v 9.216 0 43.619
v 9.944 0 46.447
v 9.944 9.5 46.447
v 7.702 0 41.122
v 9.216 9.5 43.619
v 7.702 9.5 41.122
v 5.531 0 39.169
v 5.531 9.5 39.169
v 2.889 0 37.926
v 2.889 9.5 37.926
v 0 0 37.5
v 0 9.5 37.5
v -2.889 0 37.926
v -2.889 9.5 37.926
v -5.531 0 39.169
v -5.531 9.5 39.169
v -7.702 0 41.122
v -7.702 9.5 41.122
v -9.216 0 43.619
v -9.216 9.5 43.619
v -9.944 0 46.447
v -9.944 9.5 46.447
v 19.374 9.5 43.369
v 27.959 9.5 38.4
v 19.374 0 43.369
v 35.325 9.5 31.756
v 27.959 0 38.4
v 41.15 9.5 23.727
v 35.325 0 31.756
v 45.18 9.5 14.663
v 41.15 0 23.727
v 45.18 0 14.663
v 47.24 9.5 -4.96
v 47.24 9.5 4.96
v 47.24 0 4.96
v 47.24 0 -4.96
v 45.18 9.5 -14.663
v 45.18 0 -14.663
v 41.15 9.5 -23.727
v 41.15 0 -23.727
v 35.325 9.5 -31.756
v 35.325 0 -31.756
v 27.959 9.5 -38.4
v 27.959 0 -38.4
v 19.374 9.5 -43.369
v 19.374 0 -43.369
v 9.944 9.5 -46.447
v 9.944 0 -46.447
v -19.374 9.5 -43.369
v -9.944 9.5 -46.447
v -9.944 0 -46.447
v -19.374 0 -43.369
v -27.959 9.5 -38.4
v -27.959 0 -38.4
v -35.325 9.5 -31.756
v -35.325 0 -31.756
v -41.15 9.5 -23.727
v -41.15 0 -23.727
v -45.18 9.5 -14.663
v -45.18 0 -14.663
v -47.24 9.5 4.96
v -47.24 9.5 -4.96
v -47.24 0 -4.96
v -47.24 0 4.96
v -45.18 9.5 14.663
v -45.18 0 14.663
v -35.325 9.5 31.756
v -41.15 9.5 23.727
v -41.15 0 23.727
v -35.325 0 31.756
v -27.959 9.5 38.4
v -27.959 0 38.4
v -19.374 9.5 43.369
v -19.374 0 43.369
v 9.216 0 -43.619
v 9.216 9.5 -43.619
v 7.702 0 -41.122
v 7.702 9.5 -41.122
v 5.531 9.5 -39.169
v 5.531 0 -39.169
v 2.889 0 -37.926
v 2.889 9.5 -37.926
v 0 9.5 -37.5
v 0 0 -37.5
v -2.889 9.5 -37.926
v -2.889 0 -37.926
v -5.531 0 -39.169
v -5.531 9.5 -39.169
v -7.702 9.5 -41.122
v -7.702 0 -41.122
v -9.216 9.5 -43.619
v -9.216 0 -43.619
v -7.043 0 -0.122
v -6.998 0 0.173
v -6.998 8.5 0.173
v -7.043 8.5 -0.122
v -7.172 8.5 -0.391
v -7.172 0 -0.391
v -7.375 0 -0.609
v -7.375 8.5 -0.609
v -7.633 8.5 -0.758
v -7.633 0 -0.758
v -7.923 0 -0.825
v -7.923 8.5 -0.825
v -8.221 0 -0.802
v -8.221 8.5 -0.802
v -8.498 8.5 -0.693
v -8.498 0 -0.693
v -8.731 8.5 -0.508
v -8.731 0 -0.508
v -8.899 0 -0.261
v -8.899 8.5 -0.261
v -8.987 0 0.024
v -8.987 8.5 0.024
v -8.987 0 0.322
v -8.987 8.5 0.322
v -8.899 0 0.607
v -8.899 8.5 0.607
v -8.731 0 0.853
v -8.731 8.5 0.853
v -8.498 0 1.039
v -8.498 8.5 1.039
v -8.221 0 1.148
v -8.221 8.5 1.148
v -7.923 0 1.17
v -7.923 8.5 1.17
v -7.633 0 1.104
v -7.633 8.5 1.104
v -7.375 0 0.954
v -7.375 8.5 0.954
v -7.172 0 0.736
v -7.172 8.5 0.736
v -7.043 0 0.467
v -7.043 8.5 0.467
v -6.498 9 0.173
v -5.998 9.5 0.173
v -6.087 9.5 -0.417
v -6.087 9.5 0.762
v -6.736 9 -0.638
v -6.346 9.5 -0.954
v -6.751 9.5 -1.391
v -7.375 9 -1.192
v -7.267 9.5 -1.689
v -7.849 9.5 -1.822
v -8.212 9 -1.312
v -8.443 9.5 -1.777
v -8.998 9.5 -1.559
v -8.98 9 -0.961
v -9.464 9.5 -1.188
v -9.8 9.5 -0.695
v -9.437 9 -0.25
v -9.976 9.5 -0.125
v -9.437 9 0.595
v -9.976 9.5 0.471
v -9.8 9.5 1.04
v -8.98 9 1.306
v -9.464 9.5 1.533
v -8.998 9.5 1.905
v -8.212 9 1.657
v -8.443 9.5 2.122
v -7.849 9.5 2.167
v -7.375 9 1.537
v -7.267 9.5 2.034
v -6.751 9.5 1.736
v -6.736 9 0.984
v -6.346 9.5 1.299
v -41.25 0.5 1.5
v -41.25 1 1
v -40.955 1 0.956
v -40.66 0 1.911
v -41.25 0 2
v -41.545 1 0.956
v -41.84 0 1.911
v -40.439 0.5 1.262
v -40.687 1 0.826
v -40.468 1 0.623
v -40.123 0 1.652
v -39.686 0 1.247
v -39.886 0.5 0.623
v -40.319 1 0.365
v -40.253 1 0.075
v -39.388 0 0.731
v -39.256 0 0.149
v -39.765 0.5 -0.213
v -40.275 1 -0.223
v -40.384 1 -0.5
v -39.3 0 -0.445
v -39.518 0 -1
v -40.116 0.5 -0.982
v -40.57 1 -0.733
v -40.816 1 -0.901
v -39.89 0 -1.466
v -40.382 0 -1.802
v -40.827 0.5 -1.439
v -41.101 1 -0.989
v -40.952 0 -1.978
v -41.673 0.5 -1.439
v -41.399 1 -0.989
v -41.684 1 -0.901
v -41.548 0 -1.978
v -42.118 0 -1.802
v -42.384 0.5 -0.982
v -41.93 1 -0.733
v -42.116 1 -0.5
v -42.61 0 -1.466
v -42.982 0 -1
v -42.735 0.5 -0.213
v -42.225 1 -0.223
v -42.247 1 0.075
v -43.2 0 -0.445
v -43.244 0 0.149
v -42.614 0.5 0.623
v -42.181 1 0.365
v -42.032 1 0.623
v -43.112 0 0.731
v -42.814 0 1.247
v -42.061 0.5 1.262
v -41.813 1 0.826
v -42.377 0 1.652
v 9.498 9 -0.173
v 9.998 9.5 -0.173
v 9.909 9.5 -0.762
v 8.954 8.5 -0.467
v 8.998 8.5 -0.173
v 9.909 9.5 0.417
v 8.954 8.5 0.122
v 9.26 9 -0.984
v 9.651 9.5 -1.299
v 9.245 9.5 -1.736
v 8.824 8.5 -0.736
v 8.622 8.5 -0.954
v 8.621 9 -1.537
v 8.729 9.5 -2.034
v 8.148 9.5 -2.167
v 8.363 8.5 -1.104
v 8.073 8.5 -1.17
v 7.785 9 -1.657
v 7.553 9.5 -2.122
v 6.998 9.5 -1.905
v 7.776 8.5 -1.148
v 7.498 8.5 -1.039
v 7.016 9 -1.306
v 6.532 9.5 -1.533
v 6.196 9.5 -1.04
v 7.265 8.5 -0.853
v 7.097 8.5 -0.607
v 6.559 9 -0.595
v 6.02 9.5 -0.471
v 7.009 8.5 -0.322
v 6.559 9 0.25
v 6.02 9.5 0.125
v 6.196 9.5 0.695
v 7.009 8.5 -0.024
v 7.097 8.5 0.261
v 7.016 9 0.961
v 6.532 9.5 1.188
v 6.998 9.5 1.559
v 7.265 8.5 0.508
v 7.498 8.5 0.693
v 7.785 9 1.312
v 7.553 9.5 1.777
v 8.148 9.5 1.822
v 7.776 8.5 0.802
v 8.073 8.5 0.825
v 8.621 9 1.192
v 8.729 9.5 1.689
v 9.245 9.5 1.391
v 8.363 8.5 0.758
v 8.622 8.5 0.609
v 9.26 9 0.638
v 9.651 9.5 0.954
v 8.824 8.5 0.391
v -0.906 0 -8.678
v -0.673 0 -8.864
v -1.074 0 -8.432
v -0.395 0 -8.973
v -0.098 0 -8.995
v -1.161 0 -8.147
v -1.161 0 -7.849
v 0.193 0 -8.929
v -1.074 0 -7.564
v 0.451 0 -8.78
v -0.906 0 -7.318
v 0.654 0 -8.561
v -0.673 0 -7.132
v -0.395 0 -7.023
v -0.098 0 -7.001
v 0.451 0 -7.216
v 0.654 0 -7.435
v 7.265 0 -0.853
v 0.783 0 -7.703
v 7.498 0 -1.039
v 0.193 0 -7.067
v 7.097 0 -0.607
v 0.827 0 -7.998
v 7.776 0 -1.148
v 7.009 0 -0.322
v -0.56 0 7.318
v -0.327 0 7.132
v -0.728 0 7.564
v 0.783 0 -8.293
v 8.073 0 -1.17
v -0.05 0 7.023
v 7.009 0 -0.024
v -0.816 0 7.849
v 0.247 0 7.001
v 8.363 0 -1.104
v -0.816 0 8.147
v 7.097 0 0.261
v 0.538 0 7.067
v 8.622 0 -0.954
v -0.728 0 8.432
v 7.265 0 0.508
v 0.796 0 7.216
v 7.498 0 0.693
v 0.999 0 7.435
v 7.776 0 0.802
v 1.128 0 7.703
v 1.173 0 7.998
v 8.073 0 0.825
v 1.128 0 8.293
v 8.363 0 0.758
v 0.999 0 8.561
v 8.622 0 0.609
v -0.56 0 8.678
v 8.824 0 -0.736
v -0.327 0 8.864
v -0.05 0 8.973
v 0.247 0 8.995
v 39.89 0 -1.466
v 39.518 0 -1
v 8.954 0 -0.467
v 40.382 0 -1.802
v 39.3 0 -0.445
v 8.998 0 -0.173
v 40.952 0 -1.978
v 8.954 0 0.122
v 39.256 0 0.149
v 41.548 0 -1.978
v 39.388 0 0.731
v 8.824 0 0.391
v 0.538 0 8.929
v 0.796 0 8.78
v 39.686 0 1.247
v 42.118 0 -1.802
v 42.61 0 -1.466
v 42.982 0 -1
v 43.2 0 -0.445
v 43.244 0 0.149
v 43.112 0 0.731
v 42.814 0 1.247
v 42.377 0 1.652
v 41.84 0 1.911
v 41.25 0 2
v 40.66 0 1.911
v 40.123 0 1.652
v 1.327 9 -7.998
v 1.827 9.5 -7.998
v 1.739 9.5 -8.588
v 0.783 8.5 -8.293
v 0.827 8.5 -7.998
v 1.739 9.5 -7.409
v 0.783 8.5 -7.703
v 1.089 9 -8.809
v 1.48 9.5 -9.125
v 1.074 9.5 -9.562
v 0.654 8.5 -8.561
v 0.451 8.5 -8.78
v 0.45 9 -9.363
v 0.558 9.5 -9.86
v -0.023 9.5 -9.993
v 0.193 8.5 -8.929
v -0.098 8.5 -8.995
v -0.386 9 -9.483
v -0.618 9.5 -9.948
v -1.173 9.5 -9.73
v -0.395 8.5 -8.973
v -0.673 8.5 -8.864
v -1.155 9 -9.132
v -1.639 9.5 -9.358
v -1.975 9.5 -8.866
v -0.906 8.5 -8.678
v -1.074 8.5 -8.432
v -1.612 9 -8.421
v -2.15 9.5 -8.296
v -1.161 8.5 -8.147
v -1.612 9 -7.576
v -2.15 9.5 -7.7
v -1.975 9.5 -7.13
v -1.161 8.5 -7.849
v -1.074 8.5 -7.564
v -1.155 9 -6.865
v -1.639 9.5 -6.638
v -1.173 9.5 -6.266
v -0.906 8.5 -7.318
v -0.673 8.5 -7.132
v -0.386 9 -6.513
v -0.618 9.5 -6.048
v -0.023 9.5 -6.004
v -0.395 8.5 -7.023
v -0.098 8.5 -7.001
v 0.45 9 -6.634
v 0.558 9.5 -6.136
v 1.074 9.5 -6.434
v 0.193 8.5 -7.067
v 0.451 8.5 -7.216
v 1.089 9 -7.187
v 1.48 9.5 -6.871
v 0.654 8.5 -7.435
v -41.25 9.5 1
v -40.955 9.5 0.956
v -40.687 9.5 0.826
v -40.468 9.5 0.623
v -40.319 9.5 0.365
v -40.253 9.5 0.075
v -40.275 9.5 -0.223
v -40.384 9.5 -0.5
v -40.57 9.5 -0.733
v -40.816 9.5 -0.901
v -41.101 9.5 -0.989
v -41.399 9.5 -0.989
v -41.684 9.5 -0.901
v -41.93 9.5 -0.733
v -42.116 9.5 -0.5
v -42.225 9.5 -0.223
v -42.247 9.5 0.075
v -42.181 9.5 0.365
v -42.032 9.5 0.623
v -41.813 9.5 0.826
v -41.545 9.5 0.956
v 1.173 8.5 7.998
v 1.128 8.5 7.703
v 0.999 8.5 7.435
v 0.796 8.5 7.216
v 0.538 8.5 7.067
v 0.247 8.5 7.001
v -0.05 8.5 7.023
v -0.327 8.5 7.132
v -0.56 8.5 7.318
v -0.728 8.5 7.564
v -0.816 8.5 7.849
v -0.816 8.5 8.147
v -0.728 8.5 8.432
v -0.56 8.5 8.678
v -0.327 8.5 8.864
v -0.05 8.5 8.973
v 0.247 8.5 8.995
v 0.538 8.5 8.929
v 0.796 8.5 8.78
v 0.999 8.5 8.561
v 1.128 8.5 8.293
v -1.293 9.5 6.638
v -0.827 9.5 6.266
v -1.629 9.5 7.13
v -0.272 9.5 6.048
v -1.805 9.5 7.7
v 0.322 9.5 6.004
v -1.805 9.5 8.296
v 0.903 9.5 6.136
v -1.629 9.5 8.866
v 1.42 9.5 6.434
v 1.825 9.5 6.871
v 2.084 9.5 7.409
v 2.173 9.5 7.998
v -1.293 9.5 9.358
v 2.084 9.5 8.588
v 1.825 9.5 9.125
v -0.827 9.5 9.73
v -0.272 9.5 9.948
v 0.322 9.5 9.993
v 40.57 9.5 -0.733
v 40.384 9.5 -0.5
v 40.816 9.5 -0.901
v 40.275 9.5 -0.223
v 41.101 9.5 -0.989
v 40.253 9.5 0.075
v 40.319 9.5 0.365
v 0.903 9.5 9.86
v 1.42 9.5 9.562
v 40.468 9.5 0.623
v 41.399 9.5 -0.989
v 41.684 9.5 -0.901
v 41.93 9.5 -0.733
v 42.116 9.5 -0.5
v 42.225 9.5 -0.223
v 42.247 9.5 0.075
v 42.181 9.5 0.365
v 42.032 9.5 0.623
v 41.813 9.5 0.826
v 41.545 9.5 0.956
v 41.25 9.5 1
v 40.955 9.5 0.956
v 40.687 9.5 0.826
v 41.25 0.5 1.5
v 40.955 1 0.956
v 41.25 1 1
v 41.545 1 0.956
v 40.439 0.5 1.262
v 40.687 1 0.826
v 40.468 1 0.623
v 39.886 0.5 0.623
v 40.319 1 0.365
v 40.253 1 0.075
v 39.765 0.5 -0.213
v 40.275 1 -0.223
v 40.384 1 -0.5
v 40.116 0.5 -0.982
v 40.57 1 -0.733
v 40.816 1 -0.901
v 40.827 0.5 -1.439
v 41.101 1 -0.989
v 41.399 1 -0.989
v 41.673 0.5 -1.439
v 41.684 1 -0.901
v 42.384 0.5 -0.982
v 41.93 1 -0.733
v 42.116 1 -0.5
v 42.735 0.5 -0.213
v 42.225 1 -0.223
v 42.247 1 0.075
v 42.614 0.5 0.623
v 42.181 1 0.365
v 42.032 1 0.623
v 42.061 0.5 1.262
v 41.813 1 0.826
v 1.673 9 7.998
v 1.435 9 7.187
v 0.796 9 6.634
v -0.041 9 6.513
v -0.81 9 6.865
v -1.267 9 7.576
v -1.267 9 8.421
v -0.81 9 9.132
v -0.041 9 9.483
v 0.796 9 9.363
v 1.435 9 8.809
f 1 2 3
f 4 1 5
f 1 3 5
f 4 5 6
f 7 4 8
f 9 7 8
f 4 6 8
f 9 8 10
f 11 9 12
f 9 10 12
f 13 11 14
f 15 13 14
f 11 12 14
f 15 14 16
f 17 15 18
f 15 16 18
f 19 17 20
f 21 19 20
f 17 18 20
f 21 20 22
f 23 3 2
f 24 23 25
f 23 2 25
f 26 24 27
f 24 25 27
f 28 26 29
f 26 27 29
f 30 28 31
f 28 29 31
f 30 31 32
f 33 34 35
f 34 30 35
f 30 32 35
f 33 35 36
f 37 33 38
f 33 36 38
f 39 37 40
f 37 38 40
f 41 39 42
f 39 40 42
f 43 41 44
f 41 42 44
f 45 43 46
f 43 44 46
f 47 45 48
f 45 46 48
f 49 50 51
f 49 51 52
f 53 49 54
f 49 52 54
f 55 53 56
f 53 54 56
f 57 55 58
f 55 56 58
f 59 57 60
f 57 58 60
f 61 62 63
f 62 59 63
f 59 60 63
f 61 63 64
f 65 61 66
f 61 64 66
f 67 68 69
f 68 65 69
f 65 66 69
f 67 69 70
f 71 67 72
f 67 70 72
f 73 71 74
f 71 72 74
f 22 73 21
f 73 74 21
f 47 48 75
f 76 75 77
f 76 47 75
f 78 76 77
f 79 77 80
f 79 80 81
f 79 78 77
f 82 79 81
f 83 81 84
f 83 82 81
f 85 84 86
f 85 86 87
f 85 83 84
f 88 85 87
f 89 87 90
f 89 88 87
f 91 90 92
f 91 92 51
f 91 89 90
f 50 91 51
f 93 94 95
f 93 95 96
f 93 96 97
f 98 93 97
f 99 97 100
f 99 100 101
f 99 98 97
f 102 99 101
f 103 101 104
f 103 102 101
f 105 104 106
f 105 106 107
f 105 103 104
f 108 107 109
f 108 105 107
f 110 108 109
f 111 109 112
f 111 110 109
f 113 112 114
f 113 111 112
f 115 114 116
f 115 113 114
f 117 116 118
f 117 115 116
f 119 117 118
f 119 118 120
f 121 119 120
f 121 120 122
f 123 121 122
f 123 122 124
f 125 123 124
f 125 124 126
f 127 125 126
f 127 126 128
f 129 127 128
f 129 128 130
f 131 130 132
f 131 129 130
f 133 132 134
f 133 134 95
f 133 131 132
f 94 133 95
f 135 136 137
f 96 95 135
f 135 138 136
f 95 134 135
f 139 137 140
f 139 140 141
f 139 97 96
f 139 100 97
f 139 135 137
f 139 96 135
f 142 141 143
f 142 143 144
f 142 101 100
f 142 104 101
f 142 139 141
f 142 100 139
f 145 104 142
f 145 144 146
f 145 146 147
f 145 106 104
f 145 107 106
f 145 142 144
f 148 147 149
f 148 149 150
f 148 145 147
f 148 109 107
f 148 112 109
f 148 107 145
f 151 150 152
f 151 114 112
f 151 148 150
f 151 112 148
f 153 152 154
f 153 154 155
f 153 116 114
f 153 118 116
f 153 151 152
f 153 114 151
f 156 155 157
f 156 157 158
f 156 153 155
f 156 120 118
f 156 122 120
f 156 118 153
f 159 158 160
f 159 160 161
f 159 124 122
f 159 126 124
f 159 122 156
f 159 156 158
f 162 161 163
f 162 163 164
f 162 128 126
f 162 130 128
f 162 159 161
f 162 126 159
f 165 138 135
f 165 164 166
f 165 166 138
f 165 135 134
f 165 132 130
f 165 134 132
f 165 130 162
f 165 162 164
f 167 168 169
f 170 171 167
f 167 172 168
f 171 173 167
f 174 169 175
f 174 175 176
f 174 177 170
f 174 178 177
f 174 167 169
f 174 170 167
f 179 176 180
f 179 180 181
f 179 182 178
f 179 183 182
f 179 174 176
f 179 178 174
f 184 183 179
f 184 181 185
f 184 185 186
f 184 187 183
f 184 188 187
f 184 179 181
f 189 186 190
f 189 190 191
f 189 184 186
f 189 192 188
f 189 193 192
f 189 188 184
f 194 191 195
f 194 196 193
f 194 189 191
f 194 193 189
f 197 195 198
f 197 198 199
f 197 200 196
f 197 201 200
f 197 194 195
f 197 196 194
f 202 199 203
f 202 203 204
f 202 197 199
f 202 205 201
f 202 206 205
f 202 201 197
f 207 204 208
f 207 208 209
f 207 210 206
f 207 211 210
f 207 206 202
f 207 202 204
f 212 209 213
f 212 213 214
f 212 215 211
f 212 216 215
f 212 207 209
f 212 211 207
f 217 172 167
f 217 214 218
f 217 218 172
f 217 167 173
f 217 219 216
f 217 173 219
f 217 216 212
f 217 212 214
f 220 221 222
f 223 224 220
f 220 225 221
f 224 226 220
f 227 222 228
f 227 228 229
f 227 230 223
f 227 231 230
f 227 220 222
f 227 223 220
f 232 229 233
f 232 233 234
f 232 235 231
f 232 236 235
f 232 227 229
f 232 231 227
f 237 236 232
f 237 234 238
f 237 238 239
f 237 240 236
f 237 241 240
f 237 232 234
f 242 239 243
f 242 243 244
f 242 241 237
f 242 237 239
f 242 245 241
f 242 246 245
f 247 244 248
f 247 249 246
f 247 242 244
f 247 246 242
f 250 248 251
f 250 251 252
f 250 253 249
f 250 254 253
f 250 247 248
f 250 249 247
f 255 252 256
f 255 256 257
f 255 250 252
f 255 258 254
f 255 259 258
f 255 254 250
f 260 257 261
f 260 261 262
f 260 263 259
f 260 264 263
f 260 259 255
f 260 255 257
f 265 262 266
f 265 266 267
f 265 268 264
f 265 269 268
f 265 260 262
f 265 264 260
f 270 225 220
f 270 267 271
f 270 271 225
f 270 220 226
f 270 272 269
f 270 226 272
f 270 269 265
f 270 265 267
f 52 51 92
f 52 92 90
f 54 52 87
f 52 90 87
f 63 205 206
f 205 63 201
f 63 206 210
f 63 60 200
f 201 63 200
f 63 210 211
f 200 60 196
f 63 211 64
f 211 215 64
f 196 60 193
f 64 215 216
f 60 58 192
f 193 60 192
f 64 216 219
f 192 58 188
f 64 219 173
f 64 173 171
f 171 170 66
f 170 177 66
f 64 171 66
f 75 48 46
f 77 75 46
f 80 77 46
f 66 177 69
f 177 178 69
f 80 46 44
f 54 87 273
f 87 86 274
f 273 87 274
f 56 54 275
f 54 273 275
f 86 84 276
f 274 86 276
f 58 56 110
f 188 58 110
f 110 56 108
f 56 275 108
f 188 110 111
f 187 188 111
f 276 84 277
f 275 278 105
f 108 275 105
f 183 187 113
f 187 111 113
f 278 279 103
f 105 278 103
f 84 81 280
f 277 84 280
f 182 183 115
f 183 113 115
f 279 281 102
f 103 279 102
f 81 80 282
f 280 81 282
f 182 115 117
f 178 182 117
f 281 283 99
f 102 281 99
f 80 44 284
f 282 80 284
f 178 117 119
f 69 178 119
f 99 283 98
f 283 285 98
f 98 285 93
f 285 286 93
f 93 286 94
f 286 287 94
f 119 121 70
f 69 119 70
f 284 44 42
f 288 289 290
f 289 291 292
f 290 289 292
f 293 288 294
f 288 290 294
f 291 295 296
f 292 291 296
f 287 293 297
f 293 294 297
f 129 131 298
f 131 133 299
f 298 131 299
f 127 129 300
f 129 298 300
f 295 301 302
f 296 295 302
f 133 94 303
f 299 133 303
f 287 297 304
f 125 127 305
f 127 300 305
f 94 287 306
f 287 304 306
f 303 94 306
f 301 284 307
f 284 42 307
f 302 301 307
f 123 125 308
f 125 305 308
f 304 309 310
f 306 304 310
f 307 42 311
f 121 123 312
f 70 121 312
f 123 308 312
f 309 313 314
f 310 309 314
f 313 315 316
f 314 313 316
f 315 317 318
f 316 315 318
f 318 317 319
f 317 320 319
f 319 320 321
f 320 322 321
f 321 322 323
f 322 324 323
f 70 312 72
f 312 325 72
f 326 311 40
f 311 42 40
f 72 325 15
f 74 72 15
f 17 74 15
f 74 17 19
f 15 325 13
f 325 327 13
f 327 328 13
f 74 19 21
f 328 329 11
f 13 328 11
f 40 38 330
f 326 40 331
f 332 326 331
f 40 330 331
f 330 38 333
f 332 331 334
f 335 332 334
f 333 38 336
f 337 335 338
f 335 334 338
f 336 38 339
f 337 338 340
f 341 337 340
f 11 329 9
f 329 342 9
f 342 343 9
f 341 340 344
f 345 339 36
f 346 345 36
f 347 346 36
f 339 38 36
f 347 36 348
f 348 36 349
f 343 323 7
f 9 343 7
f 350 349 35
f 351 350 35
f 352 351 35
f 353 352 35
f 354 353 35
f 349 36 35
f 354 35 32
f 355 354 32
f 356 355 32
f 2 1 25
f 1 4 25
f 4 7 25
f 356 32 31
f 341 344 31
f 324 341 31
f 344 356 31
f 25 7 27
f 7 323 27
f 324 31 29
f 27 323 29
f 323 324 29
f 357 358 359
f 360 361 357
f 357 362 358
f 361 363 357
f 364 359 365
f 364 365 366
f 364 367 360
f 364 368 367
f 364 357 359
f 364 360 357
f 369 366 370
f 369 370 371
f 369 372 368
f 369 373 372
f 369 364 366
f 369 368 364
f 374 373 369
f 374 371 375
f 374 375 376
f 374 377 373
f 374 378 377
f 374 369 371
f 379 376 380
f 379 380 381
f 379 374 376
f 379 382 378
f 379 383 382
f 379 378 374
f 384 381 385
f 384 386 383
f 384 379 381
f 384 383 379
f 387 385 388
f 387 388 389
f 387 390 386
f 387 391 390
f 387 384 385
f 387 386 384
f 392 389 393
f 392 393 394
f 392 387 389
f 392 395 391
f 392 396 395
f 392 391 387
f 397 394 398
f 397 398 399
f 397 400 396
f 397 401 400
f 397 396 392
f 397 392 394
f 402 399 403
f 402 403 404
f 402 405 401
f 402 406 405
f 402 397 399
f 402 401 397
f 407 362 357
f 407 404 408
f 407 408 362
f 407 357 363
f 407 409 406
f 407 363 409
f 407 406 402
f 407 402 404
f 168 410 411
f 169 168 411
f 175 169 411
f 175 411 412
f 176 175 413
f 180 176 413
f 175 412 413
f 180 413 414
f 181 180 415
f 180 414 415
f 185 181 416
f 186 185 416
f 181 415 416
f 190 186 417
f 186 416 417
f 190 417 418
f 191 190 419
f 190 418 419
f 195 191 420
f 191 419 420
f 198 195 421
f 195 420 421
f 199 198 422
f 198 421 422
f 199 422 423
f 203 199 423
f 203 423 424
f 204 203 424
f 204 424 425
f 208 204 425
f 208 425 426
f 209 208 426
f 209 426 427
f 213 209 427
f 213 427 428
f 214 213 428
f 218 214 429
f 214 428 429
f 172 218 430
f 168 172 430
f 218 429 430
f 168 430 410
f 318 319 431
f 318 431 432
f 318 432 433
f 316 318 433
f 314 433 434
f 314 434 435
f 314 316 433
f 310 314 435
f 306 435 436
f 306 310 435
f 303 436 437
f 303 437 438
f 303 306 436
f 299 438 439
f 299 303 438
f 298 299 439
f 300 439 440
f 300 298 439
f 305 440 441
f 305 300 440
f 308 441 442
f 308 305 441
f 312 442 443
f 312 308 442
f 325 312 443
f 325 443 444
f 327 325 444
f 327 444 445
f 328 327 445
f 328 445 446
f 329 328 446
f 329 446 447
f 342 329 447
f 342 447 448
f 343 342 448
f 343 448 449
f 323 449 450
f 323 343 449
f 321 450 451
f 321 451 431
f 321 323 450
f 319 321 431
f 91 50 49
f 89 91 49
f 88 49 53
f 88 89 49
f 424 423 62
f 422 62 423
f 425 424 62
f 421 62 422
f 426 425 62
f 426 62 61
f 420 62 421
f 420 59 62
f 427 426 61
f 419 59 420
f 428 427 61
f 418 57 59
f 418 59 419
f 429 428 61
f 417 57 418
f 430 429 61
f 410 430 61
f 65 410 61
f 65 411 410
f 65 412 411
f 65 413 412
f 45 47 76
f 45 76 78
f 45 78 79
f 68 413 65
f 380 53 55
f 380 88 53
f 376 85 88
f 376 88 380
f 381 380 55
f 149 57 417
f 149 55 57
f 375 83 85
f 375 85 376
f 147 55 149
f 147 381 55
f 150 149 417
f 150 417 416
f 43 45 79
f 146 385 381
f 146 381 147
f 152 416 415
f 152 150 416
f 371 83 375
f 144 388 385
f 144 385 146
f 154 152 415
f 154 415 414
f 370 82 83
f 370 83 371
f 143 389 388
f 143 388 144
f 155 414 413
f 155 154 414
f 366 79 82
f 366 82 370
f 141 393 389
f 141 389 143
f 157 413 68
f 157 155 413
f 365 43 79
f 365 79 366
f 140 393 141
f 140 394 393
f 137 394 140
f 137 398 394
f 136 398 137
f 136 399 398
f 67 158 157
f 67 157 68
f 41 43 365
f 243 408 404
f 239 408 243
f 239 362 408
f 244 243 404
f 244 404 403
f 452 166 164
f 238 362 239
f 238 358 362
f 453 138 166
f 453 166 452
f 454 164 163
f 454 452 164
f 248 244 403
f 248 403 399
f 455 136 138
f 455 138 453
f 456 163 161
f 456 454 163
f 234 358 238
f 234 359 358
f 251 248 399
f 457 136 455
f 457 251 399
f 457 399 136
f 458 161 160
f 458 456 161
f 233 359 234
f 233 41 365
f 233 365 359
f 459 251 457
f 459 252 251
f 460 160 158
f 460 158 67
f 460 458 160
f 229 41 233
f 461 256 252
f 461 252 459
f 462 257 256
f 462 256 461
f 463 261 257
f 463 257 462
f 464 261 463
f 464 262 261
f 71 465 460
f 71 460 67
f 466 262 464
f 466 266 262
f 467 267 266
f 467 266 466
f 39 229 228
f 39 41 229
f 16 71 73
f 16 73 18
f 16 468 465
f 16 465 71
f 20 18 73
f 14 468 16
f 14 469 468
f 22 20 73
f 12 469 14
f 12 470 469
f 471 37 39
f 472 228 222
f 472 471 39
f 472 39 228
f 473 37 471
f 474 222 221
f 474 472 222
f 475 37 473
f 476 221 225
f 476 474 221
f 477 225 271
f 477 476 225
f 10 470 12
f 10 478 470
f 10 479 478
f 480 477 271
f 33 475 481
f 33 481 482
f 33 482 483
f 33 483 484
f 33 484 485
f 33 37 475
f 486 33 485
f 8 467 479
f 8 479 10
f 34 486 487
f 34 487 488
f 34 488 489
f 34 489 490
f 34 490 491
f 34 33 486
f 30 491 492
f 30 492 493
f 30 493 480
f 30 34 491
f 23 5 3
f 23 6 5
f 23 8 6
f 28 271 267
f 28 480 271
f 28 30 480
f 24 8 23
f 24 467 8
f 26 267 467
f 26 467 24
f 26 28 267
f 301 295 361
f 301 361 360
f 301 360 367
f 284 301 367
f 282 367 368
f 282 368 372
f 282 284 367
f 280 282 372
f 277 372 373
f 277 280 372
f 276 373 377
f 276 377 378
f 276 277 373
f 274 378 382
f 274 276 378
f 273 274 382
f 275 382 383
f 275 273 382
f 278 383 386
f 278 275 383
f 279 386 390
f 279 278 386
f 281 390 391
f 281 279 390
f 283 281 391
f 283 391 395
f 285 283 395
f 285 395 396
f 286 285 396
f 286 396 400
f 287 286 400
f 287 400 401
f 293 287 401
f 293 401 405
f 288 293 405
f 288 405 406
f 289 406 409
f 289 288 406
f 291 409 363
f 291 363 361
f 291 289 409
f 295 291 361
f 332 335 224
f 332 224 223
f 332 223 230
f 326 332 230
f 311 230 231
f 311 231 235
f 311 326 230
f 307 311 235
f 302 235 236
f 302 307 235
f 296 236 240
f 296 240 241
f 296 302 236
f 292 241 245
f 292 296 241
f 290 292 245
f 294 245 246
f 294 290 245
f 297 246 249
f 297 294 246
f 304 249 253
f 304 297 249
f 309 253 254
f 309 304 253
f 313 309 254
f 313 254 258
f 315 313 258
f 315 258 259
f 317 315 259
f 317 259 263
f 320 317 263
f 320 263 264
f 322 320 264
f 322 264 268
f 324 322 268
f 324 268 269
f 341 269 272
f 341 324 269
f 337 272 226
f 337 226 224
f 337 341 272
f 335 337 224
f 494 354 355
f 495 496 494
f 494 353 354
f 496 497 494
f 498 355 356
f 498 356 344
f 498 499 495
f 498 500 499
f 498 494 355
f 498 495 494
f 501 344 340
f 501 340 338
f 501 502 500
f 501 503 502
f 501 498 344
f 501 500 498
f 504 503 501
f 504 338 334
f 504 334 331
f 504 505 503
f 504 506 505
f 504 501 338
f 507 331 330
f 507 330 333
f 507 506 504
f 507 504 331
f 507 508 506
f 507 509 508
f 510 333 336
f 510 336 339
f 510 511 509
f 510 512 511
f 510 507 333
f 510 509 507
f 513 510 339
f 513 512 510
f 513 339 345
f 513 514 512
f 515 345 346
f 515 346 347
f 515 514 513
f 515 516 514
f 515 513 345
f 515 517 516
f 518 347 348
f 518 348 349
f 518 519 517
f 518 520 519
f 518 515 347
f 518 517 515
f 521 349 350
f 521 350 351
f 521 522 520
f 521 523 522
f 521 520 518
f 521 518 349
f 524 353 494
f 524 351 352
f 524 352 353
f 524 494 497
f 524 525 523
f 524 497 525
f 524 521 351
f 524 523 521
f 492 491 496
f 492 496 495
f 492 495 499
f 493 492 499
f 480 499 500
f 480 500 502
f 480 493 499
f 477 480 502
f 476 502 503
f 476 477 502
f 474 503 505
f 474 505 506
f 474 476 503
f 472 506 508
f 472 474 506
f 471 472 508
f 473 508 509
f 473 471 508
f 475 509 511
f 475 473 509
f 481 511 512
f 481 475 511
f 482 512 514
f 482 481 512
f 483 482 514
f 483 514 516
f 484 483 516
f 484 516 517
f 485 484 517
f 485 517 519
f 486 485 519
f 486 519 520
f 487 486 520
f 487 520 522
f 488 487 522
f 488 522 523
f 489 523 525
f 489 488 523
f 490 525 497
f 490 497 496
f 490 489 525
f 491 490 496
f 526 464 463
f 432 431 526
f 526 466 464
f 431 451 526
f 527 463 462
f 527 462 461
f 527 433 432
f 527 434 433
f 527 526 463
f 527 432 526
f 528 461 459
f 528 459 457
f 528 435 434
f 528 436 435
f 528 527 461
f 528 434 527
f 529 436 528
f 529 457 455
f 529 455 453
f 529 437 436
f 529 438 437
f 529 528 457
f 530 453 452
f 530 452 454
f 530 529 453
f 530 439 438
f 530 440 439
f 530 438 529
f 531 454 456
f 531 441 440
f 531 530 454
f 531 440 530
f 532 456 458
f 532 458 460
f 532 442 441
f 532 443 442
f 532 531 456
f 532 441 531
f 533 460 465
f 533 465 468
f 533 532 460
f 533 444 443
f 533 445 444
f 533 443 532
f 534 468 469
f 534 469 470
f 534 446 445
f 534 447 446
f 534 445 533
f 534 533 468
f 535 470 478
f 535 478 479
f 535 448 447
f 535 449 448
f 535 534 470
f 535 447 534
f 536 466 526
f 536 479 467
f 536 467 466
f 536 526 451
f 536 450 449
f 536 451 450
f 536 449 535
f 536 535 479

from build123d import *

# Parameters (mm, degrees)
SKETCH1_R                = 47.5
BOSS_EXTRUDE1_DEPTH      = 9.5
CUT_EXTRUDE1_DEPTH       = 9.5
CAVITY1_OUTLINE_R        = 1
CAVITY1_DEPTH            = 9.5
CHAMFER1_SIZE            = 1
SKETCH3_R                = 1
CUT_EXTRUDE2_DEPTH       = 9.5
CHAMFER2_SIZE            = 1
CHAMFER2_OF_MIRROR2_SIZE = 1


# Read off the part's stored shape, not the designer's step: Cavity1
with BuildPart() as part:
    # Sketch1 → Boss-Extrude1 (new body)
    with BuildSketch(Plane(origin=(0, 0, 0), x_dir=(1, 0, 0), z_dir=(0, 1, 0))):
        with Locations(Location((0, 0, 0), (0, 0, 270))):
            Circle(SKETCH1_R)
    extrude(amount=BOSS_EXTRUDE1_DEPTH)

    # Sketch2 → Cut-Extrude1 (cut)
    with BuildSketch(Plane(origin=(0, 9.5, 0), x_dir=(1, 0, 0), z_dir=(0, 1, 0))):
        with BuildLine():
            Line((-10, 47.5), (10, 47.5))
            ThreePointArc((10, 47.5), (0, 37.5), (-10, 47.5))
        make_face()
    cut_extrude1 = extrude(amount=-CUT_EXTRUDE1_DEPTH, mode=Mode.SUBTRACT)

    # Mirror1: Cut-Extrude1 across plane
    add(cut_extrude1.mirror(Plane.XY), mode=Mode.SUBTRACT)

    # Cavity1 outline → Cavity1 (cut)
    with BuildSketch(Plane(origin=(0, 0, 0), x_dir=(1, 0, 0), z_dir=(0, 1, 0))):
        with Locations((7.9981372, 0.17263061)):
            Circle(CAVITY1_OUTLINE_R)
        with Locations((0.17263061, -7.9981372)):
            Circle(CAVITY1_OUTLINE_R)
        with Locations((-0.17263061, 7.9981372)):
            Circle(CAVITY1_OUTLINE_R)
        with Locations((-7.9981372, -0.17263061)):
            Circle(CAVITY1_OUTLINE_R)
    extrude(amount=CAVITY1_DEPTH, mode=Mode.SUBTRACT)

    # Chamfer1
    chamfer1_edges = [part.edges().sort_by_distance(p)[0] for p in [
        (-8.9981372, 9.5, 0.17263061),
        (-1.17263061, 9.5, -7.9981372),
        (-0.82736939, 9.5, 7.9981372),
        (6.9981372, 9.5, -0.17263061),
    ]]
    chamfer(chamfer1_edges, length=CHAMFER1_SIZE)

    # Sketch3 → Cut-Extrude2 (cut)
    with BuildSketch(Plane(origin=(0, 9.5, 0), x_dir=(1, 0, 0), z_dir=(0, 1, 0))):
        with Locations(Location((-41.25, 0, 0), (0, 0, 270))):
            Circle(SKETCH3_R)
    cut_extrude2 = extrude(amount=-CUT_EXTRUDE2_DEPTH, mode=Mode.SUBTRACT)

    # Chamfer2
    chamfer2_edges = [part.edges().sort_by_distance(p)[0] for p in [
        (-41.25, 0, -1),
    ]]
    chamfer(chamfer2_edges, length=CHAMFER2_SIZE)

    # Mirror2: Cut-Extrude2 across plane
    add(cut_extrude2.mirror(Plane(origin=(0, 0, 0), x_dir=(0, 0, 1), z_dir=(1, 0, 0))), mode=Mode.SUBTRACT)

    # Chamfer2 of Mirror2
    chamfer2_of_mirror2_edges = [part.edges().sort_by_distance(p)[0] for p in [
        (41.25, 0, -1),
    ]]
    chamfer(chamfer2_of_mirror2_edges, length=CHAMFER2_OF_MIRROR2_SIZE)


solid = part.part
